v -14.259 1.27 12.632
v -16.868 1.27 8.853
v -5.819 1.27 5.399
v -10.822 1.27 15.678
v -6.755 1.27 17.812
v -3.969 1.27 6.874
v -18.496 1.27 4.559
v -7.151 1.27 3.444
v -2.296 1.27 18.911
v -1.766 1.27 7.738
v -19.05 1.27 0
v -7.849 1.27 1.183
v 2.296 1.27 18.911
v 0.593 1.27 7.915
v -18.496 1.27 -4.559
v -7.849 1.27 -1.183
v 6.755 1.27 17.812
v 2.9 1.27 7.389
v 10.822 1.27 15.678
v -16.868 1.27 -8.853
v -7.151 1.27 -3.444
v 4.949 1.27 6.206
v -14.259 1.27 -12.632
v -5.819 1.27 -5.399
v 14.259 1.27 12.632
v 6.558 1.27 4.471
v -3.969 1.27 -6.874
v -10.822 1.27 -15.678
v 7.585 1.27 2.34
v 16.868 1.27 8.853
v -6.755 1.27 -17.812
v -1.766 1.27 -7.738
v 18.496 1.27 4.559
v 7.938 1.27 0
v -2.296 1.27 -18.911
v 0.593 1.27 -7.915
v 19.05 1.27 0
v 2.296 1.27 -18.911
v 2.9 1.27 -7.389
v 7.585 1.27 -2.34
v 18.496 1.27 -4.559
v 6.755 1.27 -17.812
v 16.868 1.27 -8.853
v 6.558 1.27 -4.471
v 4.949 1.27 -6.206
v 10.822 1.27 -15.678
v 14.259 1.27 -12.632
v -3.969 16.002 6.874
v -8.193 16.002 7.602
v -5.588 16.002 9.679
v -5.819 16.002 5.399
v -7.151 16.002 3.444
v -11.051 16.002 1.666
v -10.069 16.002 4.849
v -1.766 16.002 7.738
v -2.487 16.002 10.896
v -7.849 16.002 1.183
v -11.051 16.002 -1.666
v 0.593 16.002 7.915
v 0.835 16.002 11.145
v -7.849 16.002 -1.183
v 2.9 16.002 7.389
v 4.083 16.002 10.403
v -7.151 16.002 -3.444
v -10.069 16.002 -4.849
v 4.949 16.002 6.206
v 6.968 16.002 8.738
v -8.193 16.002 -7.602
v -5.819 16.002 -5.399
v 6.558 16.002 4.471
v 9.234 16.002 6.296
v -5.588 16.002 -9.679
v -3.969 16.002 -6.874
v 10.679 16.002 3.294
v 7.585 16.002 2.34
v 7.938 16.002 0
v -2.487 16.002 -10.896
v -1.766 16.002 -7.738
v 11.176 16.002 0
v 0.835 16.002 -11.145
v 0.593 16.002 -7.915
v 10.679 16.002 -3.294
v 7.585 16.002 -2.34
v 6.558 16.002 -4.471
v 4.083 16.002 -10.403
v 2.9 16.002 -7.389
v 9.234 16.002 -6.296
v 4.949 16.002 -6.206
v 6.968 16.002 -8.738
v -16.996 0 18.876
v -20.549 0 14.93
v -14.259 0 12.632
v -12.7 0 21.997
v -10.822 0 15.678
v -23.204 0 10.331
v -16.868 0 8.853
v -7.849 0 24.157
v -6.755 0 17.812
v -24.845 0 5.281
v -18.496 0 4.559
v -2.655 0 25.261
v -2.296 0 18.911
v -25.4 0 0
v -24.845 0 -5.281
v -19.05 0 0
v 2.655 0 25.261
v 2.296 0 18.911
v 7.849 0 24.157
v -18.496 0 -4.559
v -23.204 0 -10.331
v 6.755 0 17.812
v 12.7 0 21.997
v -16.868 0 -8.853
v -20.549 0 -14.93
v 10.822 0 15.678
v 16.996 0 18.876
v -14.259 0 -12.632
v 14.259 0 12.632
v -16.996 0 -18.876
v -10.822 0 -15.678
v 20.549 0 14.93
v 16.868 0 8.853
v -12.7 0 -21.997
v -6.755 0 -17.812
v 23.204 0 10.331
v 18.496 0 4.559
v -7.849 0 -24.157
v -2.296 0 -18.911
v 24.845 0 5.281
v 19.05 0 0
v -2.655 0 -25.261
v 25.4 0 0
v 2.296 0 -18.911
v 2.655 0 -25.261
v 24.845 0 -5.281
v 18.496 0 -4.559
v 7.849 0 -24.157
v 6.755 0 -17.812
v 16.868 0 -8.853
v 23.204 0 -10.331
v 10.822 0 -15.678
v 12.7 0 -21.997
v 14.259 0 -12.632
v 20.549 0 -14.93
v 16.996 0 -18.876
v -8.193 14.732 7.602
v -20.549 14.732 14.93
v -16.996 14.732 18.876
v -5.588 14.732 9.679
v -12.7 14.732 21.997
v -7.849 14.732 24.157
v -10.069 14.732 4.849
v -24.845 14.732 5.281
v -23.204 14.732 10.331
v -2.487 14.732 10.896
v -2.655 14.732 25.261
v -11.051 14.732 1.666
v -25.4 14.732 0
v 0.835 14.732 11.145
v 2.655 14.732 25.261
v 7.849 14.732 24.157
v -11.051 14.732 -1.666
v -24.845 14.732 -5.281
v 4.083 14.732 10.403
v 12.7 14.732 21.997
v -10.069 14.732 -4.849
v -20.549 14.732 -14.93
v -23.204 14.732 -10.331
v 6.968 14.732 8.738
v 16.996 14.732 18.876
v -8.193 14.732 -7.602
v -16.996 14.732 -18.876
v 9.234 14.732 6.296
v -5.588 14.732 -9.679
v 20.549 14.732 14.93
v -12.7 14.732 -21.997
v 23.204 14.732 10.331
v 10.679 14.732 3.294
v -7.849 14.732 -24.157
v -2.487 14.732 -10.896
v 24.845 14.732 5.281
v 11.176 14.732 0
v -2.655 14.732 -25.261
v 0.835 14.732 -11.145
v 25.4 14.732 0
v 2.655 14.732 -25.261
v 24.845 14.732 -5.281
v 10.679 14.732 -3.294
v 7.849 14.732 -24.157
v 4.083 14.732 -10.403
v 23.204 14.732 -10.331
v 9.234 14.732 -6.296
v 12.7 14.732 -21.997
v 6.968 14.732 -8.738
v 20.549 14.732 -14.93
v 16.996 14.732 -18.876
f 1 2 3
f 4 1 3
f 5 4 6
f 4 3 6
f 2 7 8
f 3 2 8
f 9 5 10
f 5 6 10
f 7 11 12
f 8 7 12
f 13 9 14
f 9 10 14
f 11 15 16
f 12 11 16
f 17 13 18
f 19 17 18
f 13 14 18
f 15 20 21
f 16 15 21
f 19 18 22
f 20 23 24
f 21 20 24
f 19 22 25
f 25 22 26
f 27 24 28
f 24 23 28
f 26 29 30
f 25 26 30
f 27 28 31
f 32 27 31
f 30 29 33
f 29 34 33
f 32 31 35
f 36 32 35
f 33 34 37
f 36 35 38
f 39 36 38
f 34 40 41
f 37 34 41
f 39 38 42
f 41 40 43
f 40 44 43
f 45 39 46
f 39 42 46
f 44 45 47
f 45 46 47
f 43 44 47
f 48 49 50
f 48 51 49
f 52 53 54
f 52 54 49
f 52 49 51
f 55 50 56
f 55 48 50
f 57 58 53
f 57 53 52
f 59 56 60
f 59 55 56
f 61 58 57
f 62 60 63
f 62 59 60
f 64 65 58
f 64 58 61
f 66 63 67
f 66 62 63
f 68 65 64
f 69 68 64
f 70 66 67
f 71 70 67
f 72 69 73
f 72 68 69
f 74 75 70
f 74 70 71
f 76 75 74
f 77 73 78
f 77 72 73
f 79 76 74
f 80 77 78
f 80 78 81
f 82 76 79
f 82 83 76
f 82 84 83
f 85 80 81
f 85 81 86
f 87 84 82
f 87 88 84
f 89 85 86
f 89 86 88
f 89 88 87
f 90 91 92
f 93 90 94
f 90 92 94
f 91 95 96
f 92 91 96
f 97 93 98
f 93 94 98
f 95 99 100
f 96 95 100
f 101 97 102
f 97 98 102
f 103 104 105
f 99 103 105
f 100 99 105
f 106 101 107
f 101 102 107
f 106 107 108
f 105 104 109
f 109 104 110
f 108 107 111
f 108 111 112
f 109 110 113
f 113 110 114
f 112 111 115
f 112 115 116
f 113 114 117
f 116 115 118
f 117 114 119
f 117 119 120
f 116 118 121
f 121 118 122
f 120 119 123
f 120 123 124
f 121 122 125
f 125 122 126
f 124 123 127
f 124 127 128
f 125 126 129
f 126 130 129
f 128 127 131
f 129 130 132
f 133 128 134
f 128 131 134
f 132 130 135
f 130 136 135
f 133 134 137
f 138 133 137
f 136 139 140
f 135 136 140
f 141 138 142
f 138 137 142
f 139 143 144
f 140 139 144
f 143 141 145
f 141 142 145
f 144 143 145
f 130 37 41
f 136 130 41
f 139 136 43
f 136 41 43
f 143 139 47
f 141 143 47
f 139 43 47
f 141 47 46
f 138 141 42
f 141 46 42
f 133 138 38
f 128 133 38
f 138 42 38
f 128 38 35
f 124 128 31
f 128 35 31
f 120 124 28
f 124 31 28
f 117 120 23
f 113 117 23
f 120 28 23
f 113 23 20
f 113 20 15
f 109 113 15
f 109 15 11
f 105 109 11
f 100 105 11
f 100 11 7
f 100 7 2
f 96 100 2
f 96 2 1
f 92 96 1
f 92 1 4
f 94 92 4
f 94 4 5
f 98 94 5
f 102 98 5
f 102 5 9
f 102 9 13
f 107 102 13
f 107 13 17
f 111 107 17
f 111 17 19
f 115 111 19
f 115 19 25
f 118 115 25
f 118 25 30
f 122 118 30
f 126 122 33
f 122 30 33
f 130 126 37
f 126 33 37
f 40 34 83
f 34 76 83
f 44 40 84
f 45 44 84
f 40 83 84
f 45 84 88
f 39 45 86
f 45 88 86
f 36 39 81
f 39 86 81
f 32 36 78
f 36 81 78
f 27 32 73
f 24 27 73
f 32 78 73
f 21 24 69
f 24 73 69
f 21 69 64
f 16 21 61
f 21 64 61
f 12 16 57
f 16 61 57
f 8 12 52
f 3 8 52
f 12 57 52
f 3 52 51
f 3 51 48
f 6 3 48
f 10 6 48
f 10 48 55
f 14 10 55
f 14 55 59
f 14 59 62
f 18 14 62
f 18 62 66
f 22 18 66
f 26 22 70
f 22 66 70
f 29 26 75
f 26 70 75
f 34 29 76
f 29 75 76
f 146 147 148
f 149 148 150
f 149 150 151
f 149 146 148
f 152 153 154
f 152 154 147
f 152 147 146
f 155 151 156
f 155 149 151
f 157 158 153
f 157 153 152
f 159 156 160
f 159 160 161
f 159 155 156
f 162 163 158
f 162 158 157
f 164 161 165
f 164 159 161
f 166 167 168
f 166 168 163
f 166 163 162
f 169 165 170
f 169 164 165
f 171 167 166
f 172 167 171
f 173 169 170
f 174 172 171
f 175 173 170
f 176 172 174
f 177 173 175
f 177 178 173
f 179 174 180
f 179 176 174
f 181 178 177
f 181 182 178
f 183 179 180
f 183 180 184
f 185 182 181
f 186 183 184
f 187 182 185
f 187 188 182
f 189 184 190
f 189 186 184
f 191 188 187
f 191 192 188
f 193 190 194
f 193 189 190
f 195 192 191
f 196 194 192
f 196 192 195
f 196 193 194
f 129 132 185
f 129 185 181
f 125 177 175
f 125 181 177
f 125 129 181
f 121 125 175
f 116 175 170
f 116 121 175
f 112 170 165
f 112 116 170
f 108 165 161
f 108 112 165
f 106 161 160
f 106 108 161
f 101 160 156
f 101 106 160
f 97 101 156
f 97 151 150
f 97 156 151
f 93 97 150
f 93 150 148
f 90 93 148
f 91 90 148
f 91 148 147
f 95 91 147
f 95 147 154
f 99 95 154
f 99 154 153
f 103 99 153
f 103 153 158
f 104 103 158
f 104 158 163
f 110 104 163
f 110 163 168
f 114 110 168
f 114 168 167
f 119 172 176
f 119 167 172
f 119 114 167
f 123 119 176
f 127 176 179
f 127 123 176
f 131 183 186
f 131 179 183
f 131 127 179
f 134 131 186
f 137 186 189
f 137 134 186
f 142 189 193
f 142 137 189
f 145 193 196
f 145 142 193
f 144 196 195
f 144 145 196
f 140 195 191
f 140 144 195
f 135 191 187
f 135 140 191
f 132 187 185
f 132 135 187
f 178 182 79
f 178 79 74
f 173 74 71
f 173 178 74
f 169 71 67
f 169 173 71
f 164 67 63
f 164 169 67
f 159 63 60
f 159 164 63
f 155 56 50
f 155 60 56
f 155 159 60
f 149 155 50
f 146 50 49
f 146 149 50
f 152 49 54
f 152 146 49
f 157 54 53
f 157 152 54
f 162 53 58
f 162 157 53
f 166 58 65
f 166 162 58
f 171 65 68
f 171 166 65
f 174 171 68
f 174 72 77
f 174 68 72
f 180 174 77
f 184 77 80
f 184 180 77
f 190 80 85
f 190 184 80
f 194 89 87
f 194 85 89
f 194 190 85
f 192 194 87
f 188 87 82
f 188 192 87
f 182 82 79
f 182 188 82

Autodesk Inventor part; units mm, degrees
ref_plane "YZ Plane" through (0, 0, 0) normal (1, 0, 0) x (0, 1, 0)
ref_plane "XZ Plane" through (0, 0, 0) normal (0, 1, 0) x (-1, 0, 0)
ref_plane "XY Plane" through (0, 0, 0) normal (0, 0, 1) x (1, 0, 0)
sketch "Sketch1" plane through (0, 0, 0) normal (0, 0, 1) x (1, 0, 0)
  line L0 (7.9375, 16.002) -> (11.176, 16.002)
  line L1 (11.176, 16.002) -> (11.176, 14.732)
  line L2 (11.176, 14.732) -> (25.4, 14.732)
  line L3 (25.4, 14.732) -> (25.4, 0)
  line L4 (25.4, 0) -> (19.05, 0)
  line L5 (19.05, 0) -> (19.05, 1.27)
  line L6 (19.05, 1.27) -> (7.9375, 1.27)
  line L7 (7.9375, 1.27) -> (7.9375, 16.002)
  line L8 (0, -2.0008) -> (0, 23.5688) construction
  point P0 (0, 0)
  dimension "d0" = 25.4
  dimension "d1" = 19.05
  dimension "d2" = 7.9375
  dimension "d3" = 1.27
  dimension "d4" = 11.176
  dimension "d5" = 16.002
  dimension "d6" = 1.27
revolve "Revolution1" add sketch "Sketch1" angle 360 about axis through (0, -2.0008, 0) along (0, 1, 0)
properties part number "Load Cell"
